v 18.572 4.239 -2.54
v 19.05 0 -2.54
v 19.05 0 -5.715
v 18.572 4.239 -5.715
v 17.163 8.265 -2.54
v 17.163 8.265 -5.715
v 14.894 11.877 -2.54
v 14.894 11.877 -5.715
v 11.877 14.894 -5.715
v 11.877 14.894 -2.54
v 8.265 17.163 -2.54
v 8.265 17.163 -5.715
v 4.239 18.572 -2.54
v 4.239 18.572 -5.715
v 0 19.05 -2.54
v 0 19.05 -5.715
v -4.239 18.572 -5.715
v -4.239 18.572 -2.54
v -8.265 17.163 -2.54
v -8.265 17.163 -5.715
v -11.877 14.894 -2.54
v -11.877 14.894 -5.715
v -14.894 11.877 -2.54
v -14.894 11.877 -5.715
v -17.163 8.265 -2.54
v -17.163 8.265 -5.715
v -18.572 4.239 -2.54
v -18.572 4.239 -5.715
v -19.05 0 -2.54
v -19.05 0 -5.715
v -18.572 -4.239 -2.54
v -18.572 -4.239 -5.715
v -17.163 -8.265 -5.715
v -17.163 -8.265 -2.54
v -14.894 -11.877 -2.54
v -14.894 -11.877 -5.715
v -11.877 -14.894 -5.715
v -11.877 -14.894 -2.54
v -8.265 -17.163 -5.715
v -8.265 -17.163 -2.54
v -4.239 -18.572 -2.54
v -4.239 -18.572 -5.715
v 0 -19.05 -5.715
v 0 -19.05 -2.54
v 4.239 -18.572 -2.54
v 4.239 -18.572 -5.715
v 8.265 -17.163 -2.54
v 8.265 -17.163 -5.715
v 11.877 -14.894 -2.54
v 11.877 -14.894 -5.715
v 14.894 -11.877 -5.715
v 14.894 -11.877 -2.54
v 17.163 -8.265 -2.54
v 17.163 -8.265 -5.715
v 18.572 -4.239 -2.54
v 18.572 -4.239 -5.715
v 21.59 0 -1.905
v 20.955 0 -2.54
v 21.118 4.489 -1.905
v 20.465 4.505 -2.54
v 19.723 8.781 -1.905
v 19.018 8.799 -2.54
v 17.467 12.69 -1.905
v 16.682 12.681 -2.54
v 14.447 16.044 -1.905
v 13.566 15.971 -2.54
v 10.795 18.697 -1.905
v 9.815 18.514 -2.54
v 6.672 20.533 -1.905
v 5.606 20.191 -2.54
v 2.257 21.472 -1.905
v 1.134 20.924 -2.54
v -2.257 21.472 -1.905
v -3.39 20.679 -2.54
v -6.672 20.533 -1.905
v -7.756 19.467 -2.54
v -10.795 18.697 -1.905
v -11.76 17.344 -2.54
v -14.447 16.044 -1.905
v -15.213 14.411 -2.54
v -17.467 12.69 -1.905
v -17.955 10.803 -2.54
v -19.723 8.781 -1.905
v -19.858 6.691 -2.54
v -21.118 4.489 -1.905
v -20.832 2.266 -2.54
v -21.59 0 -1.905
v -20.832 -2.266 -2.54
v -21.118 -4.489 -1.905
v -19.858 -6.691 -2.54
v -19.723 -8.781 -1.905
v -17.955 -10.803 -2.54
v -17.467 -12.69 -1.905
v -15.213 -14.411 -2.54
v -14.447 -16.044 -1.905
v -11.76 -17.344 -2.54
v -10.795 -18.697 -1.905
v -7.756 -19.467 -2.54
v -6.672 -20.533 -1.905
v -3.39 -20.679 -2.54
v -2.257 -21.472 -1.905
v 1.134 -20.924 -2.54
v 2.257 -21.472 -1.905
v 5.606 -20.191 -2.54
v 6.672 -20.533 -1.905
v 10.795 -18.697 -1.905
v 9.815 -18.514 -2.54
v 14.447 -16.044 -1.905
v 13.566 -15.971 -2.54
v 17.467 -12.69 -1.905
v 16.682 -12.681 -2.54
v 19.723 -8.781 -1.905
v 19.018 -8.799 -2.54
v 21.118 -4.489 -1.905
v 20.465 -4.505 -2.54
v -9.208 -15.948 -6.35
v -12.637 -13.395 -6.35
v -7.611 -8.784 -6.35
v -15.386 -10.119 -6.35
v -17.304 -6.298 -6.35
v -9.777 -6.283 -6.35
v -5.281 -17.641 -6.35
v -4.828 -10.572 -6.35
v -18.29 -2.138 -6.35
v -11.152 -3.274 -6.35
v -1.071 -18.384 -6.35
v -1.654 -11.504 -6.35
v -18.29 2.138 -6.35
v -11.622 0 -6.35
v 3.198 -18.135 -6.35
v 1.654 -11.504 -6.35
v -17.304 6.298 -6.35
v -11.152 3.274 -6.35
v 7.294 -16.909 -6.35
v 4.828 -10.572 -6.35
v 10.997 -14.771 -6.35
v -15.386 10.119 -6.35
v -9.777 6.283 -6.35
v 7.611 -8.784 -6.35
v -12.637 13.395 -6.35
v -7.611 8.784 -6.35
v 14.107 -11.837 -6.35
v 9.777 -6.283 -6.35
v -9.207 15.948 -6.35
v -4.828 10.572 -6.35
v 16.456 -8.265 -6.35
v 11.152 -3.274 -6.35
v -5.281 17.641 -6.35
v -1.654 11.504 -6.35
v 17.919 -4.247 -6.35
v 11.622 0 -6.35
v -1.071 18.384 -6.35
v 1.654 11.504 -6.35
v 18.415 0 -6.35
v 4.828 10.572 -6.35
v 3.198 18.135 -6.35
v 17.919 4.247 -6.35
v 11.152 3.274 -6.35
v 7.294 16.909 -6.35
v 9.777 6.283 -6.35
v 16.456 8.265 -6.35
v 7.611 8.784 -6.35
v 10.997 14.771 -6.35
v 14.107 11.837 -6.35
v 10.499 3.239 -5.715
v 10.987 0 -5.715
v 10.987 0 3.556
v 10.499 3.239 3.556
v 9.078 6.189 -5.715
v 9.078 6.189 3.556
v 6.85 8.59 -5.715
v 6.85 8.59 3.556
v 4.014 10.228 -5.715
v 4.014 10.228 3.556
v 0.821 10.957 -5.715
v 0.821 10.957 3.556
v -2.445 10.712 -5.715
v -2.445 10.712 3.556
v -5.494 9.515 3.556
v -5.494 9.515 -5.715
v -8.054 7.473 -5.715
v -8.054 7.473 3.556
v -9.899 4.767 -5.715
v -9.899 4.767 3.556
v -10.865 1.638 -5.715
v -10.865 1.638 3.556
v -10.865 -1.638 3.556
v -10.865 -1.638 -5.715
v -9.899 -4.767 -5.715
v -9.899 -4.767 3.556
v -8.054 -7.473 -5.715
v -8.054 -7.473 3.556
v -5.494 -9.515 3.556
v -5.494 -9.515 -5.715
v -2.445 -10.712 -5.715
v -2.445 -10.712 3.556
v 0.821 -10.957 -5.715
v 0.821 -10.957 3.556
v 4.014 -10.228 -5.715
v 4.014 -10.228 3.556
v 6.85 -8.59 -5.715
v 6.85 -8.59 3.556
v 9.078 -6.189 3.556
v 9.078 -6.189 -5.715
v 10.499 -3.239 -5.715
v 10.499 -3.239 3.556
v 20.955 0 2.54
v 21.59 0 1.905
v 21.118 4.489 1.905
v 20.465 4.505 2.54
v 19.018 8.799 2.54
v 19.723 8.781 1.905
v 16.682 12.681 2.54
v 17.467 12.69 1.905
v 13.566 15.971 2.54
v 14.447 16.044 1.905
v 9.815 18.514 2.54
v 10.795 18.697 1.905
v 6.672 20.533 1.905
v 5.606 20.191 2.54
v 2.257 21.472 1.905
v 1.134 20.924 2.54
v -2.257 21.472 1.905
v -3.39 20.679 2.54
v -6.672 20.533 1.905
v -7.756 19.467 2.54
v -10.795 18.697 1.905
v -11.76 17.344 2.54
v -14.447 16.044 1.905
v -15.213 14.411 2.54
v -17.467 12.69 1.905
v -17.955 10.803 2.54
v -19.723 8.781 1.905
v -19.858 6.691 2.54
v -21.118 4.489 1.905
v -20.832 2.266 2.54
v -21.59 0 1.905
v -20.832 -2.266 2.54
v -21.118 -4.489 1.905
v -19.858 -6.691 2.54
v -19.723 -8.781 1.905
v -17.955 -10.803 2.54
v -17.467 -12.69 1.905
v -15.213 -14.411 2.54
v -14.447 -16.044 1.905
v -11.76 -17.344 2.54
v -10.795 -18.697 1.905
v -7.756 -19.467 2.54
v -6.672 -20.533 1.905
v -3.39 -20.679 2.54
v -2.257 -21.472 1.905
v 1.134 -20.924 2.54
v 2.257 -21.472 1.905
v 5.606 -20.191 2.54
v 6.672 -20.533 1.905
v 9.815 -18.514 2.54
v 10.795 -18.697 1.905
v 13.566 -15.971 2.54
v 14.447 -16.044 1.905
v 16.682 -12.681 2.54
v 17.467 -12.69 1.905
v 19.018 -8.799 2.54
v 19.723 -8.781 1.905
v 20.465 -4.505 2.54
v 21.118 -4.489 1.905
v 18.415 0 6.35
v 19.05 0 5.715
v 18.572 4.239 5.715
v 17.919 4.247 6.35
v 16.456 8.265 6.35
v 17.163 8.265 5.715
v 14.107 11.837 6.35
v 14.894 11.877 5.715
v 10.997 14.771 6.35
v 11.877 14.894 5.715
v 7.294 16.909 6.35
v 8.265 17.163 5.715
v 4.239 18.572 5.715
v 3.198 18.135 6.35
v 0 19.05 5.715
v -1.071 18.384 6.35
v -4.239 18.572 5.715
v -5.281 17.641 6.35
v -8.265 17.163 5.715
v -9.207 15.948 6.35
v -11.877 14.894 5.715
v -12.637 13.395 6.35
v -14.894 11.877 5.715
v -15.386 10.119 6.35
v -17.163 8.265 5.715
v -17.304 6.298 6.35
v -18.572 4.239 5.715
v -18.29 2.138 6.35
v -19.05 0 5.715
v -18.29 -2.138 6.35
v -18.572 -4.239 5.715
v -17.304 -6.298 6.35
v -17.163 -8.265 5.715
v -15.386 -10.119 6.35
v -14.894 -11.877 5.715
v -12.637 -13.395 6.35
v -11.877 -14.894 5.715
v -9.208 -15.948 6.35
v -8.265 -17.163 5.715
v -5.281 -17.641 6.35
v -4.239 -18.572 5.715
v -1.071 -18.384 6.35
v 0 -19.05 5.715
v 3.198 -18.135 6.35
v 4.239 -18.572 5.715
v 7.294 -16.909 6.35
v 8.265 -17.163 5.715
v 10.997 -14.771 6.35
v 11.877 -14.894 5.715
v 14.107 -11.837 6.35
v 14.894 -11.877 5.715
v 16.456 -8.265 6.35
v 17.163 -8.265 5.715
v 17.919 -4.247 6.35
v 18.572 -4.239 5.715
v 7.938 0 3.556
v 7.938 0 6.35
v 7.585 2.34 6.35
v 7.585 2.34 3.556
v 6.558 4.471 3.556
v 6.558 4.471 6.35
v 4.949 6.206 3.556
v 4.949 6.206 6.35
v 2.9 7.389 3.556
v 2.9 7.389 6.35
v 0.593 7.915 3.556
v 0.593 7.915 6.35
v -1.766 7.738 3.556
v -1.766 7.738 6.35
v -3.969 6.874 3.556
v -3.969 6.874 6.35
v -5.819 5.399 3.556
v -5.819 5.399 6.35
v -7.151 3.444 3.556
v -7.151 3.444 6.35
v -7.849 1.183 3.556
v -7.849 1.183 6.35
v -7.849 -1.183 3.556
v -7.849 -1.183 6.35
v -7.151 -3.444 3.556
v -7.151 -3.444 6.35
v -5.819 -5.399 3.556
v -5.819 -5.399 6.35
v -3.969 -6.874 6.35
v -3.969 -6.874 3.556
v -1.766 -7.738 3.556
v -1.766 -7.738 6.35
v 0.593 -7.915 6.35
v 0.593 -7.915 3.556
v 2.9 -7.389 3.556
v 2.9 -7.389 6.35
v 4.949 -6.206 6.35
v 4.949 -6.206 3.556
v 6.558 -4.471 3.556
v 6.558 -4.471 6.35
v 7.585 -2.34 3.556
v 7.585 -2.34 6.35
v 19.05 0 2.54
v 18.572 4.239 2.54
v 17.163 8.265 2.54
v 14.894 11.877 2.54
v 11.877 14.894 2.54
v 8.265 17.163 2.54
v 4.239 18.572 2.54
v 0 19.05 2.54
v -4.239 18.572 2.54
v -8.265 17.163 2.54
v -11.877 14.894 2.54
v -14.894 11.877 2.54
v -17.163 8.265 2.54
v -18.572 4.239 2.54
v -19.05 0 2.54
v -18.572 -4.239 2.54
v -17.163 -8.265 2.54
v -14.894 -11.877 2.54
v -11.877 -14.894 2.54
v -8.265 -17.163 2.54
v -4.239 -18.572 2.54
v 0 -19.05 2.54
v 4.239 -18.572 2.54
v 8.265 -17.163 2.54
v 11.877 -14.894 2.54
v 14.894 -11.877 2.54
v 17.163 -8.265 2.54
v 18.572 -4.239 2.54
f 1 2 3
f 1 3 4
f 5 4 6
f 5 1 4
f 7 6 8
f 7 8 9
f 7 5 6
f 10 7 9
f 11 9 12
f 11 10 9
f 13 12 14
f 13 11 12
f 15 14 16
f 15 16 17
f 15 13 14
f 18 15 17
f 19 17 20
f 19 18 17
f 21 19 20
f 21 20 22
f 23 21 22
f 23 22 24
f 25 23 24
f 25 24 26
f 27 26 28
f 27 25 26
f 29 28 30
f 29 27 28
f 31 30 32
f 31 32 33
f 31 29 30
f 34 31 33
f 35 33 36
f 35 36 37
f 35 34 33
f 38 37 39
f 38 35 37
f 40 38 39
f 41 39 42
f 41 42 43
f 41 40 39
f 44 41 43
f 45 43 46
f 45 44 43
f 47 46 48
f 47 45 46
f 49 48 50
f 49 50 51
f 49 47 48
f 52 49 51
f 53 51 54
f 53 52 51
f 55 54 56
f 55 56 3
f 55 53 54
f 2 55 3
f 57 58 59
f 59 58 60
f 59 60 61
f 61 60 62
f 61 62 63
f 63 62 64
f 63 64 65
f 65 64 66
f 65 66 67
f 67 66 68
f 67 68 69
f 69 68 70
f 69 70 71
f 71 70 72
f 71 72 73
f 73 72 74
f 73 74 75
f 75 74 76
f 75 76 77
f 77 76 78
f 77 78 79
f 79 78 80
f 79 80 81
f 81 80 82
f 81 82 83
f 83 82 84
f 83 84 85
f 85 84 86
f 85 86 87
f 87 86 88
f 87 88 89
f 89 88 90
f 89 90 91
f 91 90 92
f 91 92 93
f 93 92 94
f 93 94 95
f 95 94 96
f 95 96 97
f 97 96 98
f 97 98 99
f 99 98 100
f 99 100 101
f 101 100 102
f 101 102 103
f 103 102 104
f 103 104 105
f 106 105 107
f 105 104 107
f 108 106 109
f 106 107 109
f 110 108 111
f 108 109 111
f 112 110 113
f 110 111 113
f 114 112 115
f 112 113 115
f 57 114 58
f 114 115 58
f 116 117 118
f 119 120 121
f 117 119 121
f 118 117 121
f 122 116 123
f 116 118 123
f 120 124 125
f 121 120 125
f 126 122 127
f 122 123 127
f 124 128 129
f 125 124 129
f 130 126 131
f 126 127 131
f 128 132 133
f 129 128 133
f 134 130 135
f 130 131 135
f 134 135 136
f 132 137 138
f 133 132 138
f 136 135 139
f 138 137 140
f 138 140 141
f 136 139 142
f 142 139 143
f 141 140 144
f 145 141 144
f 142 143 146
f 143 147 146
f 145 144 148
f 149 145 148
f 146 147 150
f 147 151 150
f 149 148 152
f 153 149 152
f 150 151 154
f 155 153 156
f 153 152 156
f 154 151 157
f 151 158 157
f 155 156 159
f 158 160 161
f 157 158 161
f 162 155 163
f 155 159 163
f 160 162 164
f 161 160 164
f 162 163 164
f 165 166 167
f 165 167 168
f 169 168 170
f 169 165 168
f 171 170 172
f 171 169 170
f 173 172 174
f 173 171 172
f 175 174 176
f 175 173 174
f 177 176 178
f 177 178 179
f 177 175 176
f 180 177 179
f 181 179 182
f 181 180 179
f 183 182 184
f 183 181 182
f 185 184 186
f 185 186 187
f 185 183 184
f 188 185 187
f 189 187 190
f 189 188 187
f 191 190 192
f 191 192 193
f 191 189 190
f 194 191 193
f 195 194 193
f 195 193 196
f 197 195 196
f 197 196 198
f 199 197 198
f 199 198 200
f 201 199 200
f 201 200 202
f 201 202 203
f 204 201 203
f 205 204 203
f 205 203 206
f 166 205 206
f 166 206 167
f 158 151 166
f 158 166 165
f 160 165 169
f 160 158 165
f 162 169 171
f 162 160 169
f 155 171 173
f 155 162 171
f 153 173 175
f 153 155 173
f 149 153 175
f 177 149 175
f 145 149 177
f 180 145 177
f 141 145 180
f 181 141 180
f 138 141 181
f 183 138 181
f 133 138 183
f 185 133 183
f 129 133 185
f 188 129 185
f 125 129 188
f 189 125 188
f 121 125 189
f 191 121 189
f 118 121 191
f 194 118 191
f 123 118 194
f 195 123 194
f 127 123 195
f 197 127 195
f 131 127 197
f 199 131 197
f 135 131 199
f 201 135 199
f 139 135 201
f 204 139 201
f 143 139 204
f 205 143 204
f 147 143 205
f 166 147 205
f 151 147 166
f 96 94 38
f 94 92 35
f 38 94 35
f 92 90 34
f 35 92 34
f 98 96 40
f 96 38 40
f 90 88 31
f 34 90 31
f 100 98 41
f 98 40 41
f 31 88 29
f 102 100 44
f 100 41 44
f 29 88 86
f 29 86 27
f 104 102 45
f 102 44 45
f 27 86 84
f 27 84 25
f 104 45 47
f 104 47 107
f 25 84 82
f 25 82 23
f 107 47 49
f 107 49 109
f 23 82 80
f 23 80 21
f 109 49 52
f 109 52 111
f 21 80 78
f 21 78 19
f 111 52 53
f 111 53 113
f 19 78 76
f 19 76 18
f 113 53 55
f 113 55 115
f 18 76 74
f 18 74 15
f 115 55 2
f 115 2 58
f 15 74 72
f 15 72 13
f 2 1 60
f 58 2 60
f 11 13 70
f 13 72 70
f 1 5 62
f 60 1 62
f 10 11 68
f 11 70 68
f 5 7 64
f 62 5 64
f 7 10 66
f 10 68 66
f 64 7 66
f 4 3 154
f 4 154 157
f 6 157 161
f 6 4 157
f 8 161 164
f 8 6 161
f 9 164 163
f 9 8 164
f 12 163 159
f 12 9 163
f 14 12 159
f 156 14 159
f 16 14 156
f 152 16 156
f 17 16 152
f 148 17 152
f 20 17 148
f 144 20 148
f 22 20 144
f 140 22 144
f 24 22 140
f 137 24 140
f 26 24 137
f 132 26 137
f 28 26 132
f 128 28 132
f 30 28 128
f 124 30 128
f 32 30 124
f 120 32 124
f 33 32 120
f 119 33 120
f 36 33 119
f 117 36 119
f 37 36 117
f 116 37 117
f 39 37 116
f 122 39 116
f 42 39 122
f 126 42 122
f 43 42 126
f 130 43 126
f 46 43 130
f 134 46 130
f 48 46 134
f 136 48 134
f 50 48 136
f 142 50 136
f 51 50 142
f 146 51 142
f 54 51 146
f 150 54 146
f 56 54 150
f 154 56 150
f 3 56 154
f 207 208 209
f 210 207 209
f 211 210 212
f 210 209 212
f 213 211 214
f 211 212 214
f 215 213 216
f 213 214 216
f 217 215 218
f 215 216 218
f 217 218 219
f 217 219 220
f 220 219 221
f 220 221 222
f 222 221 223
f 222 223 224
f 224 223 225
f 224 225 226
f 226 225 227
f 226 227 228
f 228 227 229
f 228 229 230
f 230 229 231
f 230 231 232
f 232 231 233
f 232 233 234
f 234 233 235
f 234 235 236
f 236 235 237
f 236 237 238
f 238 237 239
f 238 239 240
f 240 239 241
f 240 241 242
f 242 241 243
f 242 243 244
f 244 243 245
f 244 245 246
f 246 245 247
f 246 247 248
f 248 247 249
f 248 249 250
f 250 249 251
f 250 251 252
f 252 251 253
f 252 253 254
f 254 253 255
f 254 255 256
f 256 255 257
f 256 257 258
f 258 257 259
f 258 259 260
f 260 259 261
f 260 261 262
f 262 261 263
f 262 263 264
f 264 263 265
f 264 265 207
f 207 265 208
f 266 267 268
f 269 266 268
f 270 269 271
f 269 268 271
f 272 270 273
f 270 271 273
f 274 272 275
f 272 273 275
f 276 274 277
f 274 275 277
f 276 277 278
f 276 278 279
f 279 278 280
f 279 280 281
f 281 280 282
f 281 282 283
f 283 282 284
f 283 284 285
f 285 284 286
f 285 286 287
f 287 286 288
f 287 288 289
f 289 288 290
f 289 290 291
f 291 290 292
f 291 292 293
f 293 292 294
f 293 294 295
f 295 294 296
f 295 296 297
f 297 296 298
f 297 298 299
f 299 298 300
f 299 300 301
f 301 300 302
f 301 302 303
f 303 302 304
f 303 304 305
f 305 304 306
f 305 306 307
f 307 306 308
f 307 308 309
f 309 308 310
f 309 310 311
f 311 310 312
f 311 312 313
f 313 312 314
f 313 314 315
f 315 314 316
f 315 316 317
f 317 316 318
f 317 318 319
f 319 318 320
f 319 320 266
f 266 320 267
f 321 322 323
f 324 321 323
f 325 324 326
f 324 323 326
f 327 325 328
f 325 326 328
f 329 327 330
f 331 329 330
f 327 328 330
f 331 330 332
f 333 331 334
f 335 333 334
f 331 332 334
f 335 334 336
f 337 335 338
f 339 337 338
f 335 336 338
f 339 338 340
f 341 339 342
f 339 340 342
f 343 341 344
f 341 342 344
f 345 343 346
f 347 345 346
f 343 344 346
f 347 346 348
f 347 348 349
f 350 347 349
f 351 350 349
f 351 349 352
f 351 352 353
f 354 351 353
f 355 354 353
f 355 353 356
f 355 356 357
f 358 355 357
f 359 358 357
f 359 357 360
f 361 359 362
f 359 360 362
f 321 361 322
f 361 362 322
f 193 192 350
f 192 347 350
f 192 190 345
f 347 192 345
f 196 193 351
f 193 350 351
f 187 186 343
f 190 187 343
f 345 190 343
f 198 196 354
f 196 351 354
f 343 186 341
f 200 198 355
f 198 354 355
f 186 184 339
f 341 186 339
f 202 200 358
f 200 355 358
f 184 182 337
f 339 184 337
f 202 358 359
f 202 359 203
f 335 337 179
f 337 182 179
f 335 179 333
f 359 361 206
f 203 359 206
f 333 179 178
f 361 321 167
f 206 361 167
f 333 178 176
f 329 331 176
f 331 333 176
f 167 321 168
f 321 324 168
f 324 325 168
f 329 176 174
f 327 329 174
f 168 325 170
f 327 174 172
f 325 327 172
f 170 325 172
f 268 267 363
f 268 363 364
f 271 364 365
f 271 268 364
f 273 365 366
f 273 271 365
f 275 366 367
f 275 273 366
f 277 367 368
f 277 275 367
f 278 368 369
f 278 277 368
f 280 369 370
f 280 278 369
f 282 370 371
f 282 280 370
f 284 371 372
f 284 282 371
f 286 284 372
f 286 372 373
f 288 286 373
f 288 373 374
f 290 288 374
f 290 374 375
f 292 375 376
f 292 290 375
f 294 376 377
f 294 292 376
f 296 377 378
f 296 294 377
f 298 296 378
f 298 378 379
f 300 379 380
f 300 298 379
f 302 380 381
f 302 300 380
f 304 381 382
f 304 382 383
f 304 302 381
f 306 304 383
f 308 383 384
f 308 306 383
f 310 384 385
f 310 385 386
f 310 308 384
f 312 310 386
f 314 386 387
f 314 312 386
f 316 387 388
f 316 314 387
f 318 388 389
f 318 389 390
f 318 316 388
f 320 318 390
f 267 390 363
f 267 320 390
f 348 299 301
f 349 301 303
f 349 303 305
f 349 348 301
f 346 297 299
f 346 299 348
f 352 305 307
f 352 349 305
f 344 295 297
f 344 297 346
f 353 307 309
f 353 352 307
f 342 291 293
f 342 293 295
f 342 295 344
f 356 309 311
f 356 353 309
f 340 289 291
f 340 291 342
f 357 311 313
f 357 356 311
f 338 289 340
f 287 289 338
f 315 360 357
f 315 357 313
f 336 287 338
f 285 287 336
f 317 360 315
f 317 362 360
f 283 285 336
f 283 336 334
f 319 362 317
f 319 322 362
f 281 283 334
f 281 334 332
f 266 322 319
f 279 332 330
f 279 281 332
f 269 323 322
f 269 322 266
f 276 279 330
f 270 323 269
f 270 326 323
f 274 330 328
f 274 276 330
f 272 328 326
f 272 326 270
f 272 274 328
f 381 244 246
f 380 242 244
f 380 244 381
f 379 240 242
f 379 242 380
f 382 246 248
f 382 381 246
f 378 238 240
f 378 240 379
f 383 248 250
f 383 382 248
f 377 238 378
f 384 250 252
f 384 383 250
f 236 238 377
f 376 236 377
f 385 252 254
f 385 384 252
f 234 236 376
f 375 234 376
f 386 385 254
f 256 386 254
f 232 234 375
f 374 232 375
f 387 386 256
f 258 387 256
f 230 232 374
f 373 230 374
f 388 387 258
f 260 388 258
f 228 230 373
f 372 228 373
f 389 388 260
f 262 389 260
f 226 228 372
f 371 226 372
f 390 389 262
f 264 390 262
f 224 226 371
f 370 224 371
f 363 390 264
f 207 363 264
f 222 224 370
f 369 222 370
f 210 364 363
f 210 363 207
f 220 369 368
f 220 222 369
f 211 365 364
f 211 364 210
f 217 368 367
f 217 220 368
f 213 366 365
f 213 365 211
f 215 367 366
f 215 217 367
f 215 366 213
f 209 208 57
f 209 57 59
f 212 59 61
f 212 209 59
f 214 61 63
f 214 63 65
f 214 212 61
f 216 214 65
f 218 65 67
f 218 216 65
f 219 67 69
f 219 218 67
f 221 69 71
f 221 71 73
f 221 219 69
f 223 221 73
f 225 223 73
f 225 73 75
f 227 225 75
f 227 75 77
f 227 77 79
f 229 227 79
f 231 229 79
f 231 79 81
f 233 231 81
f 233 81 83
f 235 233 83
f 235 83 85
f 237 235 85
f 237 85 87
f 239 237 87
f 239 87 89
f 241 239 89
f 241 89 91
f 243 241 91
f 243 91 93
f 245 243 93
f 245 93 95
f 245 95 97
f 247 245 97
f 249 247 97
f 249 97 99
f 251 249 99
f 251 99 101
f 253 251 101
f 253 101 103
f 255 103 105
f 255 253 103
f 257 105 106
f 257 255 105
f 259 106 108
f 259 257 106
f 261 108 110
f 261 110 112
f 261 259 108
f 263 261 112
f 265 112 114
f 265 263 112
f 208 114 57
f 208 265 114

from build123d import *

# Parameters (mm, degrees)
SKETCH1_R           = 19.05
SKETCH1_R_2         = 10.9873
BOSS_EXTRUDE1_DEPTH = 6.35
SKETCH2_R           = 21.59
SKETCH2_R_2         = 10.9873
BOSS_EXTRUDE2_DEPTH = 2.54
SKETCH3_R           = 10.9873
SKETCH3_R_2         = 7.9375
BOSS_EXTRUDE3_DEPTH = 2.794
CHAMFER1_SIZE       = 0.635
CHAMFER2_SIZE       = 0.635


with BuildPart() as part:
    # Sketch1 → Boss-Extrude1 (new body, symmetric)
    with BuildSketch(Plane.XY):
        Circle(SKETCH1_R)
        Circle(SKETCH1_R_2, mode=Mode.SUBTRACT)
    extrude(amount=BOSS_EXTRUDE1_DEPTH, both=True)

    # Sketch2 → Boss-Extrude2 (add, symmetric)
    with BuildSketch(Plane.XY):
        Circle(SKETCH2_R)
        Circle(SKETCH2_R_2, mode=Mode.SUBTRACT)
    extrude(amount=BOSS_EXTRUDE2_DEPTH, both=True)

    # Sketch3 → Boss-Extrude3 (add)
    with BuildSketch(Plane.XY.offset(6.35)):
        Circle(SKETCH3_R)
        Circle(SKETCH3_R_2, mode=Mode.SUBTRACT)
    extrude(amount=-BOSS_EXTRUDE3_DEPTH)

    # Chamfer1
    chamfer1_edges = [part.edges().sort_by_distance(p)[0] for p in [
        (-21.59, 0, 2.54),
        (-21.59, 0, -2.54),
        (-19.05, 0, -6.35),
        (-19.05, 0, 6.35),
    ]]
    chamfer(chamfer1_edges, length=CHAMFER1_SIZE)

    # Chamfer2
    chamfer2_edges = [part.edges().sort_by_distance(p)[0] for p in [
        (-10.9873, 0, -6.35),
    ]]
    chamfer(chamfer2_edges, length=CHAMFER2_SIZE)


solid = part.part
